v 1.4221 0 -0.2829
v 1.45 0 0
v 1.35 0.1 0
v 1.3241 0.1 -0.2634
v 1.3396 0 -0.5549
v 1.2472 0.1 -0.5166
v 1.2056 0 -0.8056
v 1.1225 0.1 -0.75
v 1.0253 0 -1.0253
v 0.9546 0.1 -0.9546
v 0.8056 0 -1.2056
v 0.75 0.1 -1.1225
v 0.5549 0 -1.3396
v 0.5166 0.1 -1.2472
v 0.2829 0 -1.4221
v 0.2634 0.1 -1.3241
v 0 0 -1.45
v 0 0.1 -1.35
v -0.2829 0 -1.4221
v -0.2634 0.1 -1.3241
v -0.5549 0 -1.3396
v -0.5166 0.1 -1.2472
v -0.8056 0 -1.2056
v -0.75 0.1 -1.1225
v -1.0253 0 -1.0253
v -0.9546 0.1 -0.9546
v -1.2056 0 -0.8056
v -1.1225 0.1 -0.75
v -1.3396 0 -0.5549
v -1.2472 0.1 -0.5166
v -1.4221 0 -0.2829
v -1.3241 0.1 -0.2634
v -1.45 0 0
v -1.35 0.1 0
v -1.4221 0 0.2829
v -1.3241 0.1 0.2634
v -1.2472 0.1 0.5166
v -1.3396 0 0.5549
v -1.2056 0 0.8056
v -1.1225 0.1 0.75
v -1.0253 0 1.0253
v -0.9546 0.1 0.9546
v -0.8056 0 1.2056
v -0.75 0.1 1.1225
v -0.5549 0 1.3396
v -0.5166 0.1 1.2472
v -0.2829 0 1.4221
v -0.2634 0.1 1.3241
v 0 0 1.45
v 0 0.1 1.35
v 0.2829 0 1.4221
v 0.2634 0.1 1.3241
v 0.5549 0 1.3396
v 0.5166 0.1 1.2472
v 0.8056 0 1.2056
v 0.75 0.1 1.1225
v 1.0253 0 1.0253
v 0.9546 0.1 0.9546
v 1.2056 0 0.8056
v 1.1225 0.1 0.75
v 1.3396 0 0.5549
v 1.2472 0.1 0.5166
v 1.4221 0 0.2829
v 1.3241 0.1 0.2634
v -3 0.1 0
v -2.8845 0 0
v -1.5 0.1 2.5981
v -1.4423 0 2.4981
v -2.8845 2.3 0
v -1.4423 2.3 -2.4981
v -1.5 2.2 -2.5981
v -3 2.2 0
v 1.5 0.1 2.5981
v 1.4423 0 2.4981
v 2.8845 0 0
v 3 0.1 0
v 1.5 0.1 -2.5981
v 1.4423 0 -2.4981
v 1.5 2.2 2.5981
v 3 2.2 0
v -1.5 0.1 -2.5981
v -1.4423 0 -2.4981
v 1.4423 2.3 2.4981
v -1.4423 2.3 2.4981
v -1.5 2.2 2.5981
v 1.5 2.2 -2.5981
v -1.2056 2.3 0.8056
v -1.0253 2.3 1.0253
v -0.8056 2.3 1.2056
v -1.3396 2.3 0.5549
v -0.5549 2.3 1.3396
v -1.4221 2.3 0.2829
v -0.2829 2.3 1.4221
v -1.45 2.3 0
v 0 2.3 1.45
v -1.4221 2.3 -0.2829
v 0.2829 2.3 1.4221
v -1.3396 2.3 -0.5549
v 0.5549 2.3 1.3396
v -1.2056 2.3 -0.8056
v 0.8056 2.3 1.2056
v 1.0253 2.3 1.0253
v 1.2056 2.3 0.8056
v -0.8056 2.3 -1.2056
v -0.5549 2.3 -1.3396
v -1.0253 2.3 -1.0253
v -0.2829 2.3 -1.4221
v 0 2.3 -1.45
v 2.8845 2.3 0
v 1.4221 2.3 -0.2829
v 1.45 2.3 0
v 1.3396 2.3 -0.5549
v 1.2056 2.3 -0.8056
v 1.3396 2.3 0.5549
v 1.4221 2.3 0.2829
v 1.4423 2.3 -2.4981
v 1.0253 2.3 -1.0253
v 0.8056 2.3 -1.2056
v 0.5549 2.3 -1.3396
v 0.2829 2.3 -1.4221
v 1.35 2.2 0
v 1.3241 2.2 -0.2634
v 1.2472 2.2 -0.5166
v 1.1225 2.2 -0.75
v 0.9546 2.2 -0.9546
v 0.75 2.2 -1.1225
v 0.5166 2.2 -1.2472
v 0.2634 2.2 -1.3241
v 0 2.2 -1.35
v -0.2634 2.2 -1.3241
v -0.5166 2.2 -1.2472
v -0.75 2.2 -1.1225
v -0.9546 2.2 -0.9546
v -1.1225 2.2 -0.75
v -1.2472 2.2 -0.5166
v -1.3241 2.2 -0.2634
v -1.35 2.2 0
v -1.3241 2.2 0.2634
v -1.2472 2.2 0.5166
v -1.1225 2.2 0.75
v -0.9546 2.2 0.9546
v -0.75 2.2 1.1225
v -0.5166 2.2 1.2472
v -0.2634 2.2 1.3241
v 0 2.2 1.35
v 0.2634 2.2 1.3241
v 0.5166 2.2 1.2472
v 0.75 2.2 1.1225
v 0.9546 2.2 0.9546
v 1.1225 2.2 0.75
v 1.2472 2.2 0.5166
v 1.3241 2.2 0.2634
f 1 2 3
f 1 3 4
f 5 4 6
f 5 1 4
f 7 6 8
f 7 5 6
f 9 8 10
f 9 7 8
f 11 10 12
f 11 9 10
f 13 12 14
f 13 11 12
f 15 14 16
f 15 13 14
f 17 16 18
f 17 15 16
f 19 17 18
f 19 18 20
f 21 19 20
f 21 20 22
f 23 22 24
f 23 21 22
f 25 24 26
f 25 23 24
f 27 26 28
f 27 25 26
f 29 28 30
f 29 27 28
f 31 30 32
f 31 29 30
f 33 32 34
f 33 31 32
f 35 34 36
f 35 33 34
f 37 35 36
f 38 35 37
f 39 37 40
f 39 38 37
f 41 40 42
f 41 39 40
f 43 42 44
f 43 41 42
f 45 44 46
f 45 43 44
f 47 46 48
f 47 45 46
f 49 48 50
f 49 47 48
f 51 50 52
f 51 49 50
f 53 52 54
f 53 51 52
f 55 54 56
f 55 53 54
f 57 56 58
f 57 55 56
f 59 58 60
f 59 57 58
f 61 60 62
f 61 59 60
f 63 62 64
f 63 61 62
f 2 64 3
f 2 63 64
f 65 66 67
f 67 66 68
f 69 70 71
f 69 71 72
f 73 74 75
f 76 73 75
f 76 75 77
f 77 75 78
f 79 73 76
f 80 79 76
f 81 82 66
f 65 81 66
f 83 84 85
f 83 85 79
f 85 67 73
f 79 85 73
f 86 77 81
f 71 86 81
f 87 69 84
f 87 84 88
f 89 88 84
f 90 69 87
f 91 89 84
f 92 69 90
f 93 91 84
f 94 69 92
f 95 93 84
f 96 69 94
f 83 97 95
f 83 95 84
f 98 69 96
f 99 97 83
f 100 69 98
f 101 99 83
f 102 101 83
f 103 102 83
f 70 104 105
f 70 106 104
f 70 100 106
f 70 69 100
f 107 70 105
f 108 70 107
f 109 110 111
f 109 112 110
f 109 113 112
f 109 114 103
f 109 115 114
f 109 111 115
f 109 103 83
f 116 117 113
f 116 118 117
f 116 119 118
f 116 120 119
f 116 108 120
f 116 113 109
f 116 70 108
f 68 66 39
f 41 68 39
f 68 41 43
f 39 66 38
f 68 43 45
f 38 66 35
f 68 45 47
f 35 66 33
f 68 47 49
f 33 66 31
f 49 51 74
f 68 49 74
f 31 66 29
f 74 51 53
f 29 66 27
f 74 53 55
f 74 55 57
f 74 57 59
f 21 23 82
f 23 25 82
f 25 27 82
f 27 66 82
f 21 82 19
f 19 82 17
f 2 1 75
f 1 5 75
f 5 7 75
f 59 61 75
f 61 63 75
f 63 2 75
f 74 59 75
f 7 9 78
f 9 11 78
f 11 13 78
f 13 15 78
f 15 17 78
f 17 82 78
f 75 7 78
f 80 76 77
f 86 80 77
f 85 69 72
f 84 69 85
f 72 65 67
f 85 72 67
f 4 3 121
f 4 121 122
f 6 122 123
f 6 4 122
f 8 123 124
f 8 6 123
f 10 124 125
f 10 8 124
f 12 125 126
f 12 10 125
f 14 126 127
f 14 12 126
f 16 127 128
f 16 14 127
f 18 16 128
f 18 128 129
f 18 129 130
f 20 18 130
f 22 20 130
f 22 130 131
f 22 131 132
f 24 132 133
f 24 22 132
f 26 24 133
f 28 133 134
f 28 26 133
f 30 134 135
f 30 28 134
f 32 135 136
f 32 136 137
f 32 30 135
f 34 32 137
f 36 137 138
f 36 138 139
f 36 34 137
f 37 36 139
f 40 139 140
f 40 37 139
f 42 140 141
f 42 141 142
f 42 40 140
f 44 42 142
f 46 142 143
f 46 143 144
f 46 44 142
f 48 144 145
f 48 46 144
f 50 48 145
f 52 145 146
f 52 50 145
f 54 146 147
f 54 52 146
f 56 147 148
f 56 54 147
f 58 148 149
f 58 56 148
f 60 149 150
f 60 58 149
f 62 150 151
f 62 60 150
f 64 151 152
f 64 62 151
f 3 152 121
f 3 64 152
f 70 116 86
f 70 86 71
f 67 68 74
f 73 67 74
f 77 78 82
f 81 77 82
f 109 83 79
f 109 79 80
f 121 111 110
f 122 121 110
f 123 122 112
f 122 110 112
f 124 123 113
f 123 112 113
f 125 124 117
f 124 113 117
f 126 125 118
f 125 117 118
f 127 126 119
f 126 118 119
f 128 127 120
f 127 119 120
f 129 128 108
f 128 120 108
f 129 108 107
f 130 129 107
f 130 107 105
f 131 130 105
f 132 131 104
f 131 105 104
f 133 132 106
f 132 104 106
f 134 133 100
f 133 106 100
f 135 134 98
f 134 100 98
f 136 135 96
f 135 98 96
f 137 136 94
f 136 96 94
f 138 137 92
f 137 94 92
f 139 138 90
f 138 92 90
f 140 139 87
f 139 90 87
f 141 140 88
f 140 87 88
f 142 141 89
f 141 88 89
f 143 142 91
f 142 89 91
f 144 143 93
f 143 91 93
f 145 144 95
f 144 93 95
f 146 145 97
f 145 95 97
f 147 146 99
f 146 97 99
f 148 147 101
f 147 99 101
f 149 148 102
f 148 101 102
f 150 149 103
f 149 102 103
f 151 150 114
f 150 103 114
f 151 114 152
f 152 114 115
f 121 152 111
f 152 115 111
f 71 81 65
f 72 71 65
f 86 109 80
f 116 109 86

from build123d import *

# Parameters (mm, degrees)
SKETCH_1_R      = 1.35
EXTRUDE_1_DEPTH = 2.3
CHAMFER_1_SIZE  = 0.1


with BuildPart() as part:
    # Эскиз1 → Бобышка-Вытянуть1 (new body)
    with BuildSketch(Plane(origin=(0, 0, 0), x_dir=(1, 0, 0), z_dir=(0, 1, 0))):
        Polygon((3, 0), (1.5, 2.598076211), (-1.5, 2.598076211), (-3, 0), (-1.5, -2.598076211), (1.5, -2.598076211), align=None)
        Circle(SKETCH_1_R, mode=Mode.SUBTRACT)
    extrude(amount=EXTRUDE_1_DEPTH)

    # Фаска1
    chamfer_1_edges = [part.edges().sort_by_distance(p)[0] for p in [
        (0, 2.3, -2.598076211),
        (-2.25, 2.3, -1.299038106),
        (-2.25, 2.3, 1.299038106),
        (-1.35, 0, 0),
        (-1.35, 2.3, 0),
        (0, 2.3, 2.598076211),
        (2.25, 2.3, 1.299038106),
        (0, 0, 2.598076211),
        (-2.25, 0, 1.299038106),
        (-2.25, 0, -1.299038106),
        (2.25, 2.3, -1.299038106),
        (0, 0, -2.598076211),
        (2.25, 0, -1.299038106),
        (2.25, 0, 1.299038106),
    ]]
    chamfer(chamfer_1_edges, length=CHAMFER_1_SIZE)


solid = part.part
